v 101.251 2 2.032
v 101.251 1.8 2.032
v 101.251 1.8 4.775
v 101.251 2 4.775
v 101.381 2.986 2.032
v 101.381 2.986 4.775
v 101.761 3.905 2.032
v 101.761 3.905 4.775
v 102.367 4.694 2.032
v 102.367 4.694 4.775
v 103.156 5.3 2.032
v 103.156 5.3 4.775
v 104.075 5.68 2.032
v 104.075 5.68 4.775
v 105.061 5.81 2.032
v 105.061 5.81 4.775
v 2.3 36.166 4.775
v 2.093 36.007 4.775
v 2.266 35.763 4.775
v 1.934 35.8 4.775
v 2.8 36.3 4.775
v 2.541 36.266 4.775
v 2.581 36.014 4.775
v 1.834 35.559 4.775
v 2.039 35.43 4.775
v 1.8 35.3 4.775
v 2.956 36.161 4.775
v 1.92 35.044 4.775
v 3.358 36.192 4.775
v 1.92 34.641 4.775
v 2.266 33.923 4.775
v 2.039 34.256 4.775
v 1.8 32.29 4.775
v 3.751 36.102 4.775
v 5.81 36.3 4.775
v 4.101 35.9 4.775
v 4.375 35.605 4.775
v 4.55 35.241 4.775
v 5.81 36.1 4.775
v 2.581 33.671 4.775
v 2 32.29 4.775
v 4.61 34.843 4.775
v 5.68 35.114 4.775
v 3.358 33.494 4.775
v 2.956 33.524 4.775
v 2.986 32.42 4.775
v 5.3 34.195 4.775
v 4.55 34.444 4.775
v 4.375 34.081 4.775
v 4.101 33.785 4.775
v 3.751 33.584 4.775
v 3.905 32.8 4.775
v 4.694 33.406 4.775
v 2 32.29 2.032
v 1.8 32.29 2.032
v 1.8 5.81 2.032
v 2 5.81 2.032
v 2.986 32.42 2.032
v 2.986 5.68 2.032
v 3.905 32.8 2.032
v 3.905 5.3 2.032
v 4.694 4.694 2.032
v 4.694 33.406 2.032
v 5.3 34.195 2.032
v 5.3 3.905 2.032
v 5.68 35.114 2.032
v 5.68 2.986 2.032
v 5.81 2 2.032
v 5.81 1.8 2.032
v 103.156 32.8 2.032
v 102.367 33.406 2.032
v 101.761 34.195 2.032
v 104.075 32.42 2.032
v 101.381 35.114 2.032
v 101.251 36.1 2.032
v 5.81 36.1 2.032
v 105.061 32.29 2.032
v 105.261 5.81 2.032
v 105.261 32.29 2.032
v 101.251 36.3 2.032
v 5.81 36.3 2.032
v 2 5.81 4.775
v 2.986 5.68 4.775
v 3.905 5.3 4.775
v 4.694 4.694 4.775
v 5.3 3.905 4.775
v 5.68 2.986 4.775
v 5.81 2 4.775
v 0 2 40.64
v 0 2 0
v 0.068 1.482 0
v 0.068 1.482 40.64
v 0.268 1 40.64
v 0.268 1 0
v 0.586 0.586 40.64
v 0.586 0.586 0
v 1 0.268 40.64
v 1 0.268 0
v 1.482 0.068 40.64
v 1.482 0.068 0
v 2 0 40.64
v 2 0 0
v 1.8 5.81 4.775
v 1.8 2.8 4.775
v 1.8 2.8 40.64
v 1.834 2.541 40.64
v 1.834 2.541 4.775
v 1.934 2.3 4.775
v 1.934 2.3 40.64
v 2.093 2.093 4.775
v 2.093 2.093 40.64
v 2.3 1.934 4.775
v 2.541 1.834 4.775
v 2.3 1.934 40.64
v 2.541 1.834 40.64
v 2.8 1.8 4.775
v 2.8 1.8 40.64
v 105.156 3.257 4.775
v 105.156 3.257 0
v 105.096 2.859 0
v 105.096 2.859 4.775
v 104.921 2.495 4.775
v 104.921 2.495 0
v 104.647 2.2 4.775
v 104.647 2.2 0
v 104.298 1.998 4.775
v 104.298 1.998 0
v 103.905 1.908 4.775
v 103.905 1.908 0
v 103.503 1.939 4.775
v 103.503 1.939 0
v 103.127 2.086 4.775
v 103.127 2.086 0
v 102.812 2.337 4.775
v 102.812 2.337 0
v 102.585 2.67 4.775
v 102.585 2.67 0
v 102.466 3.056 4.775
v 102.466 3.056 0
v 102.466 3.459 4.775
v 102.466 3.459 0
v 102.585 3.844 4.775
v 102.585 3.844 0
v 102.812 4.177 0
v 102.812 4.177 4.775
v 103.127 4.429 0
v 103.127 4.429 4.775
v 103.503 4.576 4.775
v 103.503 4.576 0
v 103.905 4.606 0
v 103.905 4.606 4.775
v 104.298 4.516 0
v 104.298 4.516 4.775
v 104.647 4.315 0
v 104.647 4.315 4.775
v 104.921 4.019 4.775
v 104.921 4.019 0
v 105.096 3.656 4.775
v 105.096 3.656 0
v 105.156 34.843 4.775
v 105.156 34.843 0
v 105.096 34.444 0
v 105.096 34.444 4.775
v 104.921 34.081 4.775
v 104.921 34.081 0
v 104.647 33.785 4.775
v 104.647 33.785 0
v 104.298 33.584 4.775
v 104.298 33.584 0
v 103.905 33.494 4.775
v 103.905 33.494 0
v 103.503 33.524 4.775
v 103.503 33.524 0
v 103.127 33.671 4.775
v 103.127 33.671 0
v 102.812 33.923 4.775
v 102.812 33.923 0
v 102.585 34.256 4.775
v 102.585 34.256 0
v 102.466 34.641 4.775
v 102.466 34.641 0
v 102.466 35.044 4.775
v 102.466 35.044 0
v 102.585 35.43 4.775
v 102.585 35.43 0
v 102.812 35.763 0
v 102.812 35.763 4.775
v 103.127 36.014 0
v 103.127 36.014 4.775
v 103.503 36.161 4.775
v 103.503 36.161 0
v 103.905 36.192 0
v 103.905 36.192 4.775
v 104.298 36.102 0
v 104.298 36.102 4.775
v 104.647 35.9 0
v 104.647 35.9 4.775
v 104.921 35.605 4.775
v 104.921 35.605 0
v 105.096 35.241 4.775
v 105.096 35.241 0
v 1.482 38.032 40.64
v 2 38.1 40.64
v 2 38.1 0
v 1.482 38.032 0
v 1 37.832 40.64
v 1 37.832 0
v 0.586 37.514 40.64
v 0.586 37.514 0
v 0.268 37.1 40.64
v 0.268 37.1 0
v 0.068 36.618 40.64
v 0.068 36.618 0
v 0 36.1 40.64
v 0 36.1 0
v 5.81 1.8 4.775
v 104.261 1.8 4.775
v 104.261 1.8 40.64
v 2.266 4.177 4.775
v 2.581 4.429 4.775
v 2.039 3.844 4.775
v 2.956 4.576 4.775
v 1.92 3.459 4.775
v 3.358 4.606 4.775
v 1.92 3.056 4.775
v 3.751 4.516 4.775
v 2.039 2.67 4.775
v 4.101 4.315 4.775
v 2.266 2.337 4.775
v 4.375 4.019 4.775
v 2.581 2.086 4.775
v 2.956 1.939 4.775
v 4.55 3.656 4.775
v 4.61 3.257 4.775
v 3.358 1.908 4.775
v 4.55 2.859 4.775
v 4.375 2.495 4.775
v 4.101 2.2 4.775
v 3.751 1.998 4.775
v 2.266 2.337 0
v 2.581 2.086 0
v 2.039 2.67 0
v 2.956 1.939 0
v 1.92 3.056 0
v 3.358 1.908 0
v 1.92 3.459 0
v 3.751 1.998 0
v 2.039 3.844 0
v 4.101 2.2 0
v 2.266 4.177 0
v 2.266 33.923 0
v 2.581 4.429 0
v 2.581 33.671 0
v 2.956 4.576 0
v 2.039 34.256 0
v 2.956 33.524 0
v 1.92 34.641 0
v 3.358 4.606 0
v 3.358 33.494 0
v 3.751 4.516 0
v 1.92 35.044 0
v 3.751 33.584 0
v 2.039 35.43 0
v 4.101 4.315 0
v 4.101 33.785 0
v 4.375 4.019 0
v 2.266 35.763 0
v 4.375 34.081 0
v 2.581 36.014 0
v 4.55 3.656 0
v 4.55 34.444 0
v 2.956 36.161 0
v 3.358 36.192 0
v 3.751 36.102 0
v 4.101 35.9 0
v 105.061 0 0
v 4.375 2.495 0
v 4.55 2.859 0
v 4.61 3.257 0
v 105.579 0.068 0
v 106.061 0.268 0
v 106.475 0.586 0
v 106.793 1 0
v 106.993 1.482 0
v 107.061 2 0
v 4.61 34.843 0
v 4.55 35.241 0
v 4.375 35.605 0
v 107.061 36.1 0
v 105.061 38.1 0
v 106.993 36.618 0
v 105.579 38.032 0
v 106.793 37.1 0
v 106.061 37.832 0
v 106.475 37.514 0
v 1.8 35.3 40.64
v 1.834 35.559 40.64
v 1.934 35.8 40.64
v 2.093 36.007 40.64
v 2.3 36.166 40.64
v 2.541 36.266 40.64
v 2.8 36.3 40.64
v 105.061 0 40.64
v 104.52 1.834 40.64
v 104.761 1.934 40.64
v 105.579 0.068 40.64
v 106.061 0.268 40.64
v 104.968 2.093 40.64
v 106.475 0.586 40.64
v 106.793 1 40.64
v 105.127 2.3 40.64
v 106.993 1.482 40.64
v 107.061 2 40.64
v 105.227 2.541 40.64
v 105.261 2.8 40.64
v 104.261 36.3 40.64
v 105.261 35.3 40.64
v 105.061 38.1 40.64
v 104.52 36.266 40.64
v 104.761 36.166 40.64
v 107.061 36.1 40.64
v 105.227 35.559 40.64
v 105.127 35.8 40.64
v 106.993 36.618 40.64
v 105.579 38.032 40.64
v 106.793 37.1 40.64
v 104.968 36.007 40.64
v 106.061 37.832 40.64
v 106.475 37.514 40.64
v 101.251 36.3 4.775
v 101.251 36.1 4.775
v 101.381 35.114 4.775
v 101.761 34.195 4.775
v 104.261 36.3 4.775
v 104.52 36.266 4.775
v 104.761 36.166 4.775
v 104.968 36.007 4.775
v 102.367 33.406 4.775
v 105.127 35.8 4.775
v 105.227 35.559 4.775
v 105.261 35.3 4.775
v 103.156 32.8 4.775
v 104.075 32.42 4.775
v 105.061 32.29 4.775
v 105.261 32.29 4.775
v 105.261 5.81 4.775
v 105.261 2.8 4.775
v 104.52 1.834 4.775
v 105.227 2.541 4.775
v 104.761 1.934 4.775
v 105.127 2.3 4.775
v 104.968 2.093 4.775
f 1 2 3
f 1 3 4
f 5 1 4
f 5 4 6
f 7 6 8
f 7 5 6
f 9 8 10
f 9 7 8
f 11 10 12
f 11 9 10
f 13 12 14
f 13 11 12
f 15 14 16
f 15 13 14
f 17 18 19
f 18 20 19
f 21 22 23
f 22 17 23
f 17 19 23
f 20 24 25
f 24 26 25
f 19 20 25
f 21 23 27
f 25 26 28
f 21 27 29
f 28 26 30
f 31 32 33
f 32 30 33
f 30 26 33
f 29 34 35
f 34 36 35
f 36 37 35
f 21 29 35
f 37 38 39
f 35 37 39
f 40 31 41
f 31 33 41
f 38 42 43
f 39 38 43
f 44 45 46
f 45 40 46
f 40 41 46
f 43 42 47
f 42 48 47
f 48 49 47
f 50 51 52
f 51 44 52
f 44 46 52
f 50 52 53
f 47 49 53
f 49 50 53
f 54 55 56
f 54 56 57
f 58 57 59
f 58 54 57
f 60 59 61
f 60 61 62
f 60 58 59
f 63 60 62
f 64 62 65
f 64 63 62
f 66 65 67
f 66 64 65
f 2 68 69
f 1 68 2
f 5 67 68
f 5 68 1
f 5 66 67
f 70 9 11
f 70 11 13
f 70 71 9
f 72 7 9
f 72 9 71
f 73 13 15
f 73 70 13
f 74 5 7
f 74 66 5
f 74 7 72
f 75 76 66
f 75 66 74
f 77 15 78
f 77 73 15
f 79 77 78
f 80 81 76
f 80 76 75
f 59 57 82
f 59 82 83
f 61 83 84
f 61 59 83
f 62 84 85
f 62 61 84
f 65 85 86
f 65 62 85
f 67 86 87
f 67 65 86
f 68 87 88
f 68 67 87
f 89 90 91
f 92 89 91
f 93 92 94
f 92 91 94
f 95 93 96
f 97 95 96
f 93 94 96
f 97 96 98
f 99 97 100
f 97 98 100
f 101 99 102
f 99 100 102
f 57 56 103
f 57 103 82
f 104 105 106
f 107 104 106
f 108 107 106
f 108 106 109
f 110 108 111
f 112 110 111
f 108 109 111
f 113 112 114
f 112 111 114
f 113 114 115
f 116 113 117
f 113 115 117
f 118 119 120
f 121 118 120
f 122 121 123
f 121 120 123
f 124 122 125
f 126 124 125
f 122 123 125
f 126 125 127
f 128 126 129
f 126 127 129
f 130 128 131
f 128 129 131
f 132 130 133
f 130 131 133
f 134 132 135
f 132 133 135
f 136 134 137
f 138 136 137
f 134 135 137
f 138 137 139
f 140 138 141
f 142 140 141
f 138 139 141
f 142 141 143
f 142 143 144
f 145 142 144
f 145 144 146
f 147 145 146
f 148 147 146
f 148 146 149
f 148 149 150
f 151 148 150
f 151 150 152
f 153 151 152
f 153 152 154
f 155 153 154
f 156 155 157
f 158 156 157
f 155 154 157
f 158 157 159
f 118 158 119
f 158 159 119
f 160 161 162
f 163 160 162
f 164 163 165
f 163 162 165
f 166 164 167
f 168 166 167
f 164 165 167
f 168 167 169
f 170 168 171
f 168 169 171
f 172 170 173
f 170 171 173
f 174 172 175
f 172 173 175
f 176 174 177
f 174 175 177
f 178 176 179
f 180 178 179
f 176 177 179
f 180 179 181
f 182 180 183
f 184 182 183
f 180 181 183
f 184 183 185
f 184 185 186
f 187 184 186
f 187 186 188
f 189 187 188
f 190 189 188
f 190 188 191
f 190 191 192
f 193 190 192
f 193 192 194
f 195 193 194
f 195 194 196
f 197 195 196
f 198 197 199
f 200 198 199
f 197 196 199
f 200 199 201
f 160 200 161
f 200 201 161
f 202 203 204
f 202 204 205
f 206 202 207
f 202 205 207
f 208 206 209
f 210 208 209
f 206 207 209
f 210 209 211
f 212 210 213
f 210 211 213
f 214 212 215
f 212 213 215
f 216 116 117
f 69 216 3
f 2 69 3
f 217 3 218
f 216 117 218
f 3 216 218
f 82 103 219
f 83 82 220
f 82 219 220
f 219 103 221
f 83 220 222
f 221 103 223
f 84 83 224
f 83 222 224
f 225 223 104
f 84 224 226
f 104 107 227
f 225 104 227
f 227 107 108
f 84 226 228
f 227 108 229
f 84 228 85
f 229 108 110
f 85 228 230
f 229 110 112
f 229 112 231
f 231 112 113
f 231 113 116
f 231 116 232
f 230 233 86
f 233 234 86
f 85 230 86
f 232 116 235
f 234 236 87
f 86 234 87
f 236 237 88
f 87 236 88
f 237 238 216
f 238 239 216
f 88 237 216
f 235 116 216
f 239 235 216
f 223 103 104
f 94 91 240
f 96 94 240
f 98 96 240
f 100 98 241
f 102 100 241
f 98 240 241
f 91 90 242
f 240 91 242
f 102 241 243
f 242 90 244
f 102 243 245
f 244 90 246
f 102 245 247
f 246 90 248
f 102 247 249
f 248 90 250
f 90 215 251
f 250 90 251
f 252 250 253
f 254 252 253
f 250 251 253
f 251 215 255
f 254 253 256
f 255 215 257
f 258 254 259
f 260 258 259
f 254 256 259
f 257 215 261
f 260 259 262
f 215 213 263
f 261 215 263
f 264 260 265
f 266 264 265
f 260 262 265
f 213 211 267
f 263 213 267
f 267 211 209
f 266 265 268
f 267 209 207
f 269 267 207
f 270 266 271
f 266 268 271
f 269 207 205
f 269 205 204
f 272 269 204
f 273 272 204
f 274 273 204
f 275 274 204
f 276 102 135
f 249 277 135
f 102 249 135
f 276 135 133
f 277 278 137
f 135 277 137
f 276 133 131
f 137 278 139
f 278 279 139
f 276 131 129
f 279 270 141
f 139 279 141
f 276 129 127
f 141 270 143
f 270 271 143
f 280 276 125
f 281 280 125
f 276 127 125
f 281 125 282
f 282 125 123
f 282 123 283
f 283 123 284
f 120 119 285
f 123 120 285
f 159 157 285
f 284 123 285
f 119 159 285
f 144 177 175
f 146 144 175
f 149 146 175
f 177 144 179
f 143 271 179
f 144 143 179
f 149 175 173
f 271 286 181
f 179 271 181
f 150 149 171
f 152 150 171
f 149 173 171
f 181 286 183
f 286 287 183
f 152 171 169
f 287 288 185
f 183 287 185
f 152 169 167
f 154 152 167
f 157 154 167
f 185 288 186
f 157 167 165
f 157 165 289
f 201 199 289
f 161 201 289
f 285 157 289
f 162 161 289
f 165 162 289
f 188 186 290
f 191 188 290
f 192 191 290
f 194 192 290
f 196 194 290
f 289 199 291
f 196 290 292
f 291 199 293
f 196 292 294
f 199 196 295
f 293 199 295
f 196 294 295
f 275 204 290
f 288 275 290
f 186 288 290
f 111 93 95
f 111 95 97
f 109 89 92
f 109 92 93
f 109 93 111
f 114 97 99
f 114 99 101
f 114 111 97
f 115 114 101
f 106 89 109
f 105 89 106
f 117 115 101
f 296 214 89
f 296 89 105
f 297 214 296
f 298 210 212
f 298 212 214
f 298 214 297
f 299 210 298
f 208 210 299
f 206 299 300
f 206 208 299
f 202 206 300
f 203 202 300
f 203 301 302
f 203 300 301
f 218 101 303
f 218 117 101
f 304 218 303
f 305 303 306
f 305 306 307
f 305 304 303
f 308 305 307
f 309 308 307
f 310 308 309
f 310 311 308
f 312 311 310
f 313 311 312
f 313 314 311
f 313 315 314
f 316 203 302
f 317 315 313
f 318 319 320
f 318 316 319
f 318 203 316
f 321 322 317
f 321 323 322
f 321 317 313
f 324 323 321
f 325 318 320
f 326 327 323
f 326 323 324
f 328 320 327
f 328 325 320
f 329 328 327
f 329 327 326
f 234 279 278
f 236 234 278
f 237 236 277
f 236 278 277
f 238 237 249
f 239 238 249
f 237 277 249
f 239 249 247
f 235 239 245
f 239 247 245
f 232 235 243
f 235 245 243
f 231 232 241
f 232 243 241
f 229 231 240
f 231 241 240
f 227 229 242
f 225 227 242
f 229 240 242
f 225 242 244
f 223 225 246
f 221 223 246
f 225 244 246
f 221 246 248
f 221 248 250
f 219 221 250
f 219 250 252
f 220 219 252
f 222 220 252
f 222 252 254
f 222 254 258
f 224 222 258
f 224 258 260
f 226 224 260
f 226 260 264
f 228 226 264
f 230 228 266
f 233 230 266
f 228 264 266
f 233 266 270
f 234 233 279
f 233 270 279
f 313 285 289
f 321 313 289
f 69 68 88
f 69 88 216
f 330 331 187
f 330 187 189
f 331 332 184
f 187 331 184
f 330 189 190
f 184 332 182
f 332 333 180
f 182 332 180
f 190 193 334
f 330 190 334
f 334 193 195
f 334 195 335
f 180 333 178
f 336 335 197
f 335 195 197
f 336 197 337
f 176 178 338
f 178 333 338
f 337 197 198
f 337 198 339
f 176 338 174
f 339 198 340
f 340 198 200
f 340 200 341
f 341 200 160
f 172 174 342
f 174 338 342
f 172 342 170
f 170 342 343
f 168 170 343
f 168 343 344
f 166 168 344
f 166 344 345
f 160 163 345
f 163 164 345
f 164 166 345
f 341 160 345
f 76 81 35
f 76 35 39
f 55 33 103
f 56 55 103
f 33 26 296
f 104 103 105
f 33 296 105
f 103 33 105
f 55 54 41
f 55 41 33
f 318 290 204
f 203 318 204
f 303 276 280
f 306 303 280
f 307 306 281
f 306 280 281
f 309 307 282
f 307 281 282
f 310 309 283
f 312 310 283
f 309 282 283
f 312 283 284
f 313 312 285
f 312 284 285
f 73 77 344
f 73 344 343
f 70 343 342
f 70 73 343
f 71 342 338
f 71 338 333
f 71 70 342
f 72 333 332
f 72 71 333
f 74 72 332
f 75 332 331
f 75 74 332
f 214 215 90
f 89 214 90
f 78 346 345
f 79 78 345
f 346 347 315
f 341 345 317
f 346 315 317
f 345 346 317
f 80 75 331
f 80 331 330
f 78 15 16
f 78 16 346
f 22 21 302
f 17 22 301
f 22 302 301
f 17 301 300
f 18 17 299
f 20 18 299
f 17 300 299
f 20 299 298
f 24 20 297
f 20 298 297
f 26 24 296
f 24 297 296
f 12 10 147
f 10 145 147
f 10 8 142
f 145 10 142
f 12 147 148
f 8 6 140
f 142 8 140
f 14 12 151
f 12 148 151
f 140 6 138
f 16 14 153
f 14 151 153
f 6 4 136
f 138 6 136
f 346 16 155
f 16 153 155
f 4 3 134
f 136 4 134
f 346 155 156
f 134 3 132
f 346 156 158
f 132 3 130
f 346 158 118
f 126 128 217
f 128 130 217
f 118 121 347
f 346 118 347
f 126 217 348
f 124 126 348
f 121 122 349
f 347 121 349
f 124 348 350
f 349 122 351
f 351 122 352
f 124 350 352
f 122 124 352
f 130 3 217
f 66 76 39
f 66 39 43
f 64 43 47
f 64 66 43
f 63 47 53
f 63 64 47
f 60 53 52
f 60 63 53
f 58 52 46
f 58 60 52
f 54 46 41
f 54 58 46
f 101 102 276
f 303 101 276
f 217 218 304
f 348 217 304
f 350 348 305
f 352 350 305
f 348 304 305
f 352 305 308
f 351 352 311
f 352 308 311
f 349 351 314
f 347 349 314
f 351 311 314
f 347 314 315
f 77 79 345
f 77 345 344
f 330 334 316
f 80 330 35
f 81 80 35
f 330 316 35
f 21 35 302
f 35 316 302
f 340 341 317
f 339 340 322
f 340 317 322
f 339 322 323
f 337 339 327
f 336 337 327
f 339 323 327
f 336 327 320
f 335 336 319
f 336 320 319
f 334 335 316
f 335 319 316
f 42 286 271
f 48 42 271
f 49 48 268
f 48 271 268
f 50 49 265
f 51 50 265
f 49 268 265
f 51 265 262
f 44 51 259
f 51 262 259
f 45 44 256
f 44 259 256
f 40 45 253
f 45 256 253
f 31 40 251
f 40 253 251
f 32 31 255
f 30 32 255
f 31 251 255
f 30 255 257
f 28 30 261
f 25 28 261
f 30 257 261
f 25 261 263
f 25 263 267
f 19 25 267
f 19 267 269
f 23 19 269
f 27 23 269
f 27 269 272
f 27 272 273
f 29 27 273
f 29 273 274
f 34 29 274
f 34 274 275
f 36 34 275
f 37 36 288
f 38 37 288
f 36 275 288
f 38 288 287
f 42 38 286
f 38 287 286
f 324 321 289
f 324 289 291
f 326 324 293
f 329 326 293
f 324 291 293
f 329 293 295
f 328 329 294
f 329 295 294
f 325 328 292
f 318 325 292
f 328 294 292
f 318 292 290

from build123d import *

# Parameters (mm, degrees)
F1_DEPTH = 40.64
F3_DEPTH = 38.608
F5_DEPTH = 4.7752
F6_R     = 1.35255
F7_DEPTH = 4.7752


# Not quite as in the source:
# - a feature names something its author has since deleted; it is built from what else it names


with BuildPart() as f1:
    # F0 (on Top) → F1 (new body)
    with BuildSketch(Plane.XY):
        with BuildLine():
            ThreePointArc((0, 2), (0.5857864376, 0.5857864376), (2, 0))
            Line((2, 0), (105.061, 0))
            ThreePointArc((105.061, 0), (106.4752135624, 0.5857864376), (107.061, 2))
            Line((107.061, 2), (107.061, 36.1))
            ThreePointArc((107.061, 36.1), (106.4752135624, 37.5142135624), (105.061, 38.1))
            Line((105.061, 38.1), (2, 38.1))
            ThreePointArc((2, 38.1), (0.5857864376, 37.5142135624), (0, 36.1))
            Line((0, 36.1), (0, 2))
        make_face()
    extrude(amount=F1_DEPTH)

    # F2 (on face) → F3 (cut)
    with BuildSketch(Plane.XY.offset(40.64)):
        with BuildLine():
            Line((104.261, 36.3), (2.8, 36.3))
            ThreePointArc((2.8, 36.3), (2.0928932188, 36.0071067812), (1.8, 35.3))
            Line((1.8, 35.3), (1.8, 2.8))
            ThreePointArc((1.8, 2.8), (2.0928932188, 2.0928932188), (2.8, 1.8))
            Line((2.8, 1.8), (104.261, 1.8))
            ThreePointArc((104.261, 1.8), (104.9681067812, 2.0928932188), (105.261, 2.8))
            Line((105.261, 2.8), (105.261, 35.3))
            ThreePointArc((105.261, 35.3), (104.9681067812, 36.0071067812), (104.261, 36.3))
        make_face()
    extrude(amount=-F3_DEPTH, mode=Mode.SUBTRACT)

    # F4 (on face) → F5 (join)
    with BuildSketch(Plane(origin=(0, 0, 0), x_dir=(1, 0, 0), z_dir=(0, 0, -1))):
        with BuildLine():
            ThreePointArc((107.061, -2), (106.4752135624, -0.5857864376), (105.061, 0))
            Line((105.061, 0), (101.251, 0))
            Line((101.251, 0), (101.251, -2))
            ThreePointArc((101.251, -2), (102.3669231637, -4.6940768363), (105.061, -5.81))
            Line((105.061, -5.81), (107.061, -5.81))
            Line((107.061, -5.81), (107.061, -2))
        make_face()
        with BuildLine():
            Line((101.251, -36.1), (101.251, -38.1))
            Line((101.251, -38.1), (105.061, -38.1))
            ThreePointArc((105.061, -38.1), (106.4752135624, -37.5142135624), (107.061, -36.1))
            Line((107.061, -36.1), (107.061, -32.29))
            Line((107.061, -32.29), (105.061, -32.29))
            ThreePointArc((105.061, -32.29), (102.3669231637, -33.4059231637), (101.251, -36.1))
        make_face()
        with BuildLine():
            ThreePointArc((5.81, -36.1), (4.6940768363, -33.4059231637), (2, -32.29))
            Line((2, -32.29), (0, -32.29))
            Line((0, -32.29), (0, -36.1))
            ThreePointArc((0, -36.1), (0.5857864376, -37.5142135624), (2, -38.1))
            Line((2, -38.1), (5.81, -38.1))
            Line((5.81, -38.1), (5.81, -36.1))
        make_face()
        with BuildLine():
            Line((5.81, 0), (2, 0))
            ThreePointArc((2, 0), (0.5857864376, -0.5857864376), (0, -2))
            Line((0, -2), (0, -5.81))
            Line((0, -5.81), (2, -5.81))
            ThreePointArc((2, -5.81), (4.6940768363, -4.6940768363), (5.81, -2))
            Line((5.81, -2), (5.81, 0))
        make_face()
    extrude(amount=-F5_DEPTH)

    # F6 (on face) → F7 (cut, through all)
    with BuildSketch(Plane(origin=(0, 0, 0), x_dir=(1, 0, 0), z_dir=(0, 0, -1))):
        with Locations((103.8037641431, -3.2572358569)):
            Circle(F6_R)
        with Locations((3.2572358569, -3.2572358569)):
            Circle(F6_R)
        with Locations((3.2572358569, -34.8427641431)):
            Circle(F6_R)
        with Locations((103.8037641431, -34.8427641431)):
            Circle(F6_R)
    extrude(amount=-F7_DEPTH, mode=Mode.SUBTRACT)


solid = f1.part
